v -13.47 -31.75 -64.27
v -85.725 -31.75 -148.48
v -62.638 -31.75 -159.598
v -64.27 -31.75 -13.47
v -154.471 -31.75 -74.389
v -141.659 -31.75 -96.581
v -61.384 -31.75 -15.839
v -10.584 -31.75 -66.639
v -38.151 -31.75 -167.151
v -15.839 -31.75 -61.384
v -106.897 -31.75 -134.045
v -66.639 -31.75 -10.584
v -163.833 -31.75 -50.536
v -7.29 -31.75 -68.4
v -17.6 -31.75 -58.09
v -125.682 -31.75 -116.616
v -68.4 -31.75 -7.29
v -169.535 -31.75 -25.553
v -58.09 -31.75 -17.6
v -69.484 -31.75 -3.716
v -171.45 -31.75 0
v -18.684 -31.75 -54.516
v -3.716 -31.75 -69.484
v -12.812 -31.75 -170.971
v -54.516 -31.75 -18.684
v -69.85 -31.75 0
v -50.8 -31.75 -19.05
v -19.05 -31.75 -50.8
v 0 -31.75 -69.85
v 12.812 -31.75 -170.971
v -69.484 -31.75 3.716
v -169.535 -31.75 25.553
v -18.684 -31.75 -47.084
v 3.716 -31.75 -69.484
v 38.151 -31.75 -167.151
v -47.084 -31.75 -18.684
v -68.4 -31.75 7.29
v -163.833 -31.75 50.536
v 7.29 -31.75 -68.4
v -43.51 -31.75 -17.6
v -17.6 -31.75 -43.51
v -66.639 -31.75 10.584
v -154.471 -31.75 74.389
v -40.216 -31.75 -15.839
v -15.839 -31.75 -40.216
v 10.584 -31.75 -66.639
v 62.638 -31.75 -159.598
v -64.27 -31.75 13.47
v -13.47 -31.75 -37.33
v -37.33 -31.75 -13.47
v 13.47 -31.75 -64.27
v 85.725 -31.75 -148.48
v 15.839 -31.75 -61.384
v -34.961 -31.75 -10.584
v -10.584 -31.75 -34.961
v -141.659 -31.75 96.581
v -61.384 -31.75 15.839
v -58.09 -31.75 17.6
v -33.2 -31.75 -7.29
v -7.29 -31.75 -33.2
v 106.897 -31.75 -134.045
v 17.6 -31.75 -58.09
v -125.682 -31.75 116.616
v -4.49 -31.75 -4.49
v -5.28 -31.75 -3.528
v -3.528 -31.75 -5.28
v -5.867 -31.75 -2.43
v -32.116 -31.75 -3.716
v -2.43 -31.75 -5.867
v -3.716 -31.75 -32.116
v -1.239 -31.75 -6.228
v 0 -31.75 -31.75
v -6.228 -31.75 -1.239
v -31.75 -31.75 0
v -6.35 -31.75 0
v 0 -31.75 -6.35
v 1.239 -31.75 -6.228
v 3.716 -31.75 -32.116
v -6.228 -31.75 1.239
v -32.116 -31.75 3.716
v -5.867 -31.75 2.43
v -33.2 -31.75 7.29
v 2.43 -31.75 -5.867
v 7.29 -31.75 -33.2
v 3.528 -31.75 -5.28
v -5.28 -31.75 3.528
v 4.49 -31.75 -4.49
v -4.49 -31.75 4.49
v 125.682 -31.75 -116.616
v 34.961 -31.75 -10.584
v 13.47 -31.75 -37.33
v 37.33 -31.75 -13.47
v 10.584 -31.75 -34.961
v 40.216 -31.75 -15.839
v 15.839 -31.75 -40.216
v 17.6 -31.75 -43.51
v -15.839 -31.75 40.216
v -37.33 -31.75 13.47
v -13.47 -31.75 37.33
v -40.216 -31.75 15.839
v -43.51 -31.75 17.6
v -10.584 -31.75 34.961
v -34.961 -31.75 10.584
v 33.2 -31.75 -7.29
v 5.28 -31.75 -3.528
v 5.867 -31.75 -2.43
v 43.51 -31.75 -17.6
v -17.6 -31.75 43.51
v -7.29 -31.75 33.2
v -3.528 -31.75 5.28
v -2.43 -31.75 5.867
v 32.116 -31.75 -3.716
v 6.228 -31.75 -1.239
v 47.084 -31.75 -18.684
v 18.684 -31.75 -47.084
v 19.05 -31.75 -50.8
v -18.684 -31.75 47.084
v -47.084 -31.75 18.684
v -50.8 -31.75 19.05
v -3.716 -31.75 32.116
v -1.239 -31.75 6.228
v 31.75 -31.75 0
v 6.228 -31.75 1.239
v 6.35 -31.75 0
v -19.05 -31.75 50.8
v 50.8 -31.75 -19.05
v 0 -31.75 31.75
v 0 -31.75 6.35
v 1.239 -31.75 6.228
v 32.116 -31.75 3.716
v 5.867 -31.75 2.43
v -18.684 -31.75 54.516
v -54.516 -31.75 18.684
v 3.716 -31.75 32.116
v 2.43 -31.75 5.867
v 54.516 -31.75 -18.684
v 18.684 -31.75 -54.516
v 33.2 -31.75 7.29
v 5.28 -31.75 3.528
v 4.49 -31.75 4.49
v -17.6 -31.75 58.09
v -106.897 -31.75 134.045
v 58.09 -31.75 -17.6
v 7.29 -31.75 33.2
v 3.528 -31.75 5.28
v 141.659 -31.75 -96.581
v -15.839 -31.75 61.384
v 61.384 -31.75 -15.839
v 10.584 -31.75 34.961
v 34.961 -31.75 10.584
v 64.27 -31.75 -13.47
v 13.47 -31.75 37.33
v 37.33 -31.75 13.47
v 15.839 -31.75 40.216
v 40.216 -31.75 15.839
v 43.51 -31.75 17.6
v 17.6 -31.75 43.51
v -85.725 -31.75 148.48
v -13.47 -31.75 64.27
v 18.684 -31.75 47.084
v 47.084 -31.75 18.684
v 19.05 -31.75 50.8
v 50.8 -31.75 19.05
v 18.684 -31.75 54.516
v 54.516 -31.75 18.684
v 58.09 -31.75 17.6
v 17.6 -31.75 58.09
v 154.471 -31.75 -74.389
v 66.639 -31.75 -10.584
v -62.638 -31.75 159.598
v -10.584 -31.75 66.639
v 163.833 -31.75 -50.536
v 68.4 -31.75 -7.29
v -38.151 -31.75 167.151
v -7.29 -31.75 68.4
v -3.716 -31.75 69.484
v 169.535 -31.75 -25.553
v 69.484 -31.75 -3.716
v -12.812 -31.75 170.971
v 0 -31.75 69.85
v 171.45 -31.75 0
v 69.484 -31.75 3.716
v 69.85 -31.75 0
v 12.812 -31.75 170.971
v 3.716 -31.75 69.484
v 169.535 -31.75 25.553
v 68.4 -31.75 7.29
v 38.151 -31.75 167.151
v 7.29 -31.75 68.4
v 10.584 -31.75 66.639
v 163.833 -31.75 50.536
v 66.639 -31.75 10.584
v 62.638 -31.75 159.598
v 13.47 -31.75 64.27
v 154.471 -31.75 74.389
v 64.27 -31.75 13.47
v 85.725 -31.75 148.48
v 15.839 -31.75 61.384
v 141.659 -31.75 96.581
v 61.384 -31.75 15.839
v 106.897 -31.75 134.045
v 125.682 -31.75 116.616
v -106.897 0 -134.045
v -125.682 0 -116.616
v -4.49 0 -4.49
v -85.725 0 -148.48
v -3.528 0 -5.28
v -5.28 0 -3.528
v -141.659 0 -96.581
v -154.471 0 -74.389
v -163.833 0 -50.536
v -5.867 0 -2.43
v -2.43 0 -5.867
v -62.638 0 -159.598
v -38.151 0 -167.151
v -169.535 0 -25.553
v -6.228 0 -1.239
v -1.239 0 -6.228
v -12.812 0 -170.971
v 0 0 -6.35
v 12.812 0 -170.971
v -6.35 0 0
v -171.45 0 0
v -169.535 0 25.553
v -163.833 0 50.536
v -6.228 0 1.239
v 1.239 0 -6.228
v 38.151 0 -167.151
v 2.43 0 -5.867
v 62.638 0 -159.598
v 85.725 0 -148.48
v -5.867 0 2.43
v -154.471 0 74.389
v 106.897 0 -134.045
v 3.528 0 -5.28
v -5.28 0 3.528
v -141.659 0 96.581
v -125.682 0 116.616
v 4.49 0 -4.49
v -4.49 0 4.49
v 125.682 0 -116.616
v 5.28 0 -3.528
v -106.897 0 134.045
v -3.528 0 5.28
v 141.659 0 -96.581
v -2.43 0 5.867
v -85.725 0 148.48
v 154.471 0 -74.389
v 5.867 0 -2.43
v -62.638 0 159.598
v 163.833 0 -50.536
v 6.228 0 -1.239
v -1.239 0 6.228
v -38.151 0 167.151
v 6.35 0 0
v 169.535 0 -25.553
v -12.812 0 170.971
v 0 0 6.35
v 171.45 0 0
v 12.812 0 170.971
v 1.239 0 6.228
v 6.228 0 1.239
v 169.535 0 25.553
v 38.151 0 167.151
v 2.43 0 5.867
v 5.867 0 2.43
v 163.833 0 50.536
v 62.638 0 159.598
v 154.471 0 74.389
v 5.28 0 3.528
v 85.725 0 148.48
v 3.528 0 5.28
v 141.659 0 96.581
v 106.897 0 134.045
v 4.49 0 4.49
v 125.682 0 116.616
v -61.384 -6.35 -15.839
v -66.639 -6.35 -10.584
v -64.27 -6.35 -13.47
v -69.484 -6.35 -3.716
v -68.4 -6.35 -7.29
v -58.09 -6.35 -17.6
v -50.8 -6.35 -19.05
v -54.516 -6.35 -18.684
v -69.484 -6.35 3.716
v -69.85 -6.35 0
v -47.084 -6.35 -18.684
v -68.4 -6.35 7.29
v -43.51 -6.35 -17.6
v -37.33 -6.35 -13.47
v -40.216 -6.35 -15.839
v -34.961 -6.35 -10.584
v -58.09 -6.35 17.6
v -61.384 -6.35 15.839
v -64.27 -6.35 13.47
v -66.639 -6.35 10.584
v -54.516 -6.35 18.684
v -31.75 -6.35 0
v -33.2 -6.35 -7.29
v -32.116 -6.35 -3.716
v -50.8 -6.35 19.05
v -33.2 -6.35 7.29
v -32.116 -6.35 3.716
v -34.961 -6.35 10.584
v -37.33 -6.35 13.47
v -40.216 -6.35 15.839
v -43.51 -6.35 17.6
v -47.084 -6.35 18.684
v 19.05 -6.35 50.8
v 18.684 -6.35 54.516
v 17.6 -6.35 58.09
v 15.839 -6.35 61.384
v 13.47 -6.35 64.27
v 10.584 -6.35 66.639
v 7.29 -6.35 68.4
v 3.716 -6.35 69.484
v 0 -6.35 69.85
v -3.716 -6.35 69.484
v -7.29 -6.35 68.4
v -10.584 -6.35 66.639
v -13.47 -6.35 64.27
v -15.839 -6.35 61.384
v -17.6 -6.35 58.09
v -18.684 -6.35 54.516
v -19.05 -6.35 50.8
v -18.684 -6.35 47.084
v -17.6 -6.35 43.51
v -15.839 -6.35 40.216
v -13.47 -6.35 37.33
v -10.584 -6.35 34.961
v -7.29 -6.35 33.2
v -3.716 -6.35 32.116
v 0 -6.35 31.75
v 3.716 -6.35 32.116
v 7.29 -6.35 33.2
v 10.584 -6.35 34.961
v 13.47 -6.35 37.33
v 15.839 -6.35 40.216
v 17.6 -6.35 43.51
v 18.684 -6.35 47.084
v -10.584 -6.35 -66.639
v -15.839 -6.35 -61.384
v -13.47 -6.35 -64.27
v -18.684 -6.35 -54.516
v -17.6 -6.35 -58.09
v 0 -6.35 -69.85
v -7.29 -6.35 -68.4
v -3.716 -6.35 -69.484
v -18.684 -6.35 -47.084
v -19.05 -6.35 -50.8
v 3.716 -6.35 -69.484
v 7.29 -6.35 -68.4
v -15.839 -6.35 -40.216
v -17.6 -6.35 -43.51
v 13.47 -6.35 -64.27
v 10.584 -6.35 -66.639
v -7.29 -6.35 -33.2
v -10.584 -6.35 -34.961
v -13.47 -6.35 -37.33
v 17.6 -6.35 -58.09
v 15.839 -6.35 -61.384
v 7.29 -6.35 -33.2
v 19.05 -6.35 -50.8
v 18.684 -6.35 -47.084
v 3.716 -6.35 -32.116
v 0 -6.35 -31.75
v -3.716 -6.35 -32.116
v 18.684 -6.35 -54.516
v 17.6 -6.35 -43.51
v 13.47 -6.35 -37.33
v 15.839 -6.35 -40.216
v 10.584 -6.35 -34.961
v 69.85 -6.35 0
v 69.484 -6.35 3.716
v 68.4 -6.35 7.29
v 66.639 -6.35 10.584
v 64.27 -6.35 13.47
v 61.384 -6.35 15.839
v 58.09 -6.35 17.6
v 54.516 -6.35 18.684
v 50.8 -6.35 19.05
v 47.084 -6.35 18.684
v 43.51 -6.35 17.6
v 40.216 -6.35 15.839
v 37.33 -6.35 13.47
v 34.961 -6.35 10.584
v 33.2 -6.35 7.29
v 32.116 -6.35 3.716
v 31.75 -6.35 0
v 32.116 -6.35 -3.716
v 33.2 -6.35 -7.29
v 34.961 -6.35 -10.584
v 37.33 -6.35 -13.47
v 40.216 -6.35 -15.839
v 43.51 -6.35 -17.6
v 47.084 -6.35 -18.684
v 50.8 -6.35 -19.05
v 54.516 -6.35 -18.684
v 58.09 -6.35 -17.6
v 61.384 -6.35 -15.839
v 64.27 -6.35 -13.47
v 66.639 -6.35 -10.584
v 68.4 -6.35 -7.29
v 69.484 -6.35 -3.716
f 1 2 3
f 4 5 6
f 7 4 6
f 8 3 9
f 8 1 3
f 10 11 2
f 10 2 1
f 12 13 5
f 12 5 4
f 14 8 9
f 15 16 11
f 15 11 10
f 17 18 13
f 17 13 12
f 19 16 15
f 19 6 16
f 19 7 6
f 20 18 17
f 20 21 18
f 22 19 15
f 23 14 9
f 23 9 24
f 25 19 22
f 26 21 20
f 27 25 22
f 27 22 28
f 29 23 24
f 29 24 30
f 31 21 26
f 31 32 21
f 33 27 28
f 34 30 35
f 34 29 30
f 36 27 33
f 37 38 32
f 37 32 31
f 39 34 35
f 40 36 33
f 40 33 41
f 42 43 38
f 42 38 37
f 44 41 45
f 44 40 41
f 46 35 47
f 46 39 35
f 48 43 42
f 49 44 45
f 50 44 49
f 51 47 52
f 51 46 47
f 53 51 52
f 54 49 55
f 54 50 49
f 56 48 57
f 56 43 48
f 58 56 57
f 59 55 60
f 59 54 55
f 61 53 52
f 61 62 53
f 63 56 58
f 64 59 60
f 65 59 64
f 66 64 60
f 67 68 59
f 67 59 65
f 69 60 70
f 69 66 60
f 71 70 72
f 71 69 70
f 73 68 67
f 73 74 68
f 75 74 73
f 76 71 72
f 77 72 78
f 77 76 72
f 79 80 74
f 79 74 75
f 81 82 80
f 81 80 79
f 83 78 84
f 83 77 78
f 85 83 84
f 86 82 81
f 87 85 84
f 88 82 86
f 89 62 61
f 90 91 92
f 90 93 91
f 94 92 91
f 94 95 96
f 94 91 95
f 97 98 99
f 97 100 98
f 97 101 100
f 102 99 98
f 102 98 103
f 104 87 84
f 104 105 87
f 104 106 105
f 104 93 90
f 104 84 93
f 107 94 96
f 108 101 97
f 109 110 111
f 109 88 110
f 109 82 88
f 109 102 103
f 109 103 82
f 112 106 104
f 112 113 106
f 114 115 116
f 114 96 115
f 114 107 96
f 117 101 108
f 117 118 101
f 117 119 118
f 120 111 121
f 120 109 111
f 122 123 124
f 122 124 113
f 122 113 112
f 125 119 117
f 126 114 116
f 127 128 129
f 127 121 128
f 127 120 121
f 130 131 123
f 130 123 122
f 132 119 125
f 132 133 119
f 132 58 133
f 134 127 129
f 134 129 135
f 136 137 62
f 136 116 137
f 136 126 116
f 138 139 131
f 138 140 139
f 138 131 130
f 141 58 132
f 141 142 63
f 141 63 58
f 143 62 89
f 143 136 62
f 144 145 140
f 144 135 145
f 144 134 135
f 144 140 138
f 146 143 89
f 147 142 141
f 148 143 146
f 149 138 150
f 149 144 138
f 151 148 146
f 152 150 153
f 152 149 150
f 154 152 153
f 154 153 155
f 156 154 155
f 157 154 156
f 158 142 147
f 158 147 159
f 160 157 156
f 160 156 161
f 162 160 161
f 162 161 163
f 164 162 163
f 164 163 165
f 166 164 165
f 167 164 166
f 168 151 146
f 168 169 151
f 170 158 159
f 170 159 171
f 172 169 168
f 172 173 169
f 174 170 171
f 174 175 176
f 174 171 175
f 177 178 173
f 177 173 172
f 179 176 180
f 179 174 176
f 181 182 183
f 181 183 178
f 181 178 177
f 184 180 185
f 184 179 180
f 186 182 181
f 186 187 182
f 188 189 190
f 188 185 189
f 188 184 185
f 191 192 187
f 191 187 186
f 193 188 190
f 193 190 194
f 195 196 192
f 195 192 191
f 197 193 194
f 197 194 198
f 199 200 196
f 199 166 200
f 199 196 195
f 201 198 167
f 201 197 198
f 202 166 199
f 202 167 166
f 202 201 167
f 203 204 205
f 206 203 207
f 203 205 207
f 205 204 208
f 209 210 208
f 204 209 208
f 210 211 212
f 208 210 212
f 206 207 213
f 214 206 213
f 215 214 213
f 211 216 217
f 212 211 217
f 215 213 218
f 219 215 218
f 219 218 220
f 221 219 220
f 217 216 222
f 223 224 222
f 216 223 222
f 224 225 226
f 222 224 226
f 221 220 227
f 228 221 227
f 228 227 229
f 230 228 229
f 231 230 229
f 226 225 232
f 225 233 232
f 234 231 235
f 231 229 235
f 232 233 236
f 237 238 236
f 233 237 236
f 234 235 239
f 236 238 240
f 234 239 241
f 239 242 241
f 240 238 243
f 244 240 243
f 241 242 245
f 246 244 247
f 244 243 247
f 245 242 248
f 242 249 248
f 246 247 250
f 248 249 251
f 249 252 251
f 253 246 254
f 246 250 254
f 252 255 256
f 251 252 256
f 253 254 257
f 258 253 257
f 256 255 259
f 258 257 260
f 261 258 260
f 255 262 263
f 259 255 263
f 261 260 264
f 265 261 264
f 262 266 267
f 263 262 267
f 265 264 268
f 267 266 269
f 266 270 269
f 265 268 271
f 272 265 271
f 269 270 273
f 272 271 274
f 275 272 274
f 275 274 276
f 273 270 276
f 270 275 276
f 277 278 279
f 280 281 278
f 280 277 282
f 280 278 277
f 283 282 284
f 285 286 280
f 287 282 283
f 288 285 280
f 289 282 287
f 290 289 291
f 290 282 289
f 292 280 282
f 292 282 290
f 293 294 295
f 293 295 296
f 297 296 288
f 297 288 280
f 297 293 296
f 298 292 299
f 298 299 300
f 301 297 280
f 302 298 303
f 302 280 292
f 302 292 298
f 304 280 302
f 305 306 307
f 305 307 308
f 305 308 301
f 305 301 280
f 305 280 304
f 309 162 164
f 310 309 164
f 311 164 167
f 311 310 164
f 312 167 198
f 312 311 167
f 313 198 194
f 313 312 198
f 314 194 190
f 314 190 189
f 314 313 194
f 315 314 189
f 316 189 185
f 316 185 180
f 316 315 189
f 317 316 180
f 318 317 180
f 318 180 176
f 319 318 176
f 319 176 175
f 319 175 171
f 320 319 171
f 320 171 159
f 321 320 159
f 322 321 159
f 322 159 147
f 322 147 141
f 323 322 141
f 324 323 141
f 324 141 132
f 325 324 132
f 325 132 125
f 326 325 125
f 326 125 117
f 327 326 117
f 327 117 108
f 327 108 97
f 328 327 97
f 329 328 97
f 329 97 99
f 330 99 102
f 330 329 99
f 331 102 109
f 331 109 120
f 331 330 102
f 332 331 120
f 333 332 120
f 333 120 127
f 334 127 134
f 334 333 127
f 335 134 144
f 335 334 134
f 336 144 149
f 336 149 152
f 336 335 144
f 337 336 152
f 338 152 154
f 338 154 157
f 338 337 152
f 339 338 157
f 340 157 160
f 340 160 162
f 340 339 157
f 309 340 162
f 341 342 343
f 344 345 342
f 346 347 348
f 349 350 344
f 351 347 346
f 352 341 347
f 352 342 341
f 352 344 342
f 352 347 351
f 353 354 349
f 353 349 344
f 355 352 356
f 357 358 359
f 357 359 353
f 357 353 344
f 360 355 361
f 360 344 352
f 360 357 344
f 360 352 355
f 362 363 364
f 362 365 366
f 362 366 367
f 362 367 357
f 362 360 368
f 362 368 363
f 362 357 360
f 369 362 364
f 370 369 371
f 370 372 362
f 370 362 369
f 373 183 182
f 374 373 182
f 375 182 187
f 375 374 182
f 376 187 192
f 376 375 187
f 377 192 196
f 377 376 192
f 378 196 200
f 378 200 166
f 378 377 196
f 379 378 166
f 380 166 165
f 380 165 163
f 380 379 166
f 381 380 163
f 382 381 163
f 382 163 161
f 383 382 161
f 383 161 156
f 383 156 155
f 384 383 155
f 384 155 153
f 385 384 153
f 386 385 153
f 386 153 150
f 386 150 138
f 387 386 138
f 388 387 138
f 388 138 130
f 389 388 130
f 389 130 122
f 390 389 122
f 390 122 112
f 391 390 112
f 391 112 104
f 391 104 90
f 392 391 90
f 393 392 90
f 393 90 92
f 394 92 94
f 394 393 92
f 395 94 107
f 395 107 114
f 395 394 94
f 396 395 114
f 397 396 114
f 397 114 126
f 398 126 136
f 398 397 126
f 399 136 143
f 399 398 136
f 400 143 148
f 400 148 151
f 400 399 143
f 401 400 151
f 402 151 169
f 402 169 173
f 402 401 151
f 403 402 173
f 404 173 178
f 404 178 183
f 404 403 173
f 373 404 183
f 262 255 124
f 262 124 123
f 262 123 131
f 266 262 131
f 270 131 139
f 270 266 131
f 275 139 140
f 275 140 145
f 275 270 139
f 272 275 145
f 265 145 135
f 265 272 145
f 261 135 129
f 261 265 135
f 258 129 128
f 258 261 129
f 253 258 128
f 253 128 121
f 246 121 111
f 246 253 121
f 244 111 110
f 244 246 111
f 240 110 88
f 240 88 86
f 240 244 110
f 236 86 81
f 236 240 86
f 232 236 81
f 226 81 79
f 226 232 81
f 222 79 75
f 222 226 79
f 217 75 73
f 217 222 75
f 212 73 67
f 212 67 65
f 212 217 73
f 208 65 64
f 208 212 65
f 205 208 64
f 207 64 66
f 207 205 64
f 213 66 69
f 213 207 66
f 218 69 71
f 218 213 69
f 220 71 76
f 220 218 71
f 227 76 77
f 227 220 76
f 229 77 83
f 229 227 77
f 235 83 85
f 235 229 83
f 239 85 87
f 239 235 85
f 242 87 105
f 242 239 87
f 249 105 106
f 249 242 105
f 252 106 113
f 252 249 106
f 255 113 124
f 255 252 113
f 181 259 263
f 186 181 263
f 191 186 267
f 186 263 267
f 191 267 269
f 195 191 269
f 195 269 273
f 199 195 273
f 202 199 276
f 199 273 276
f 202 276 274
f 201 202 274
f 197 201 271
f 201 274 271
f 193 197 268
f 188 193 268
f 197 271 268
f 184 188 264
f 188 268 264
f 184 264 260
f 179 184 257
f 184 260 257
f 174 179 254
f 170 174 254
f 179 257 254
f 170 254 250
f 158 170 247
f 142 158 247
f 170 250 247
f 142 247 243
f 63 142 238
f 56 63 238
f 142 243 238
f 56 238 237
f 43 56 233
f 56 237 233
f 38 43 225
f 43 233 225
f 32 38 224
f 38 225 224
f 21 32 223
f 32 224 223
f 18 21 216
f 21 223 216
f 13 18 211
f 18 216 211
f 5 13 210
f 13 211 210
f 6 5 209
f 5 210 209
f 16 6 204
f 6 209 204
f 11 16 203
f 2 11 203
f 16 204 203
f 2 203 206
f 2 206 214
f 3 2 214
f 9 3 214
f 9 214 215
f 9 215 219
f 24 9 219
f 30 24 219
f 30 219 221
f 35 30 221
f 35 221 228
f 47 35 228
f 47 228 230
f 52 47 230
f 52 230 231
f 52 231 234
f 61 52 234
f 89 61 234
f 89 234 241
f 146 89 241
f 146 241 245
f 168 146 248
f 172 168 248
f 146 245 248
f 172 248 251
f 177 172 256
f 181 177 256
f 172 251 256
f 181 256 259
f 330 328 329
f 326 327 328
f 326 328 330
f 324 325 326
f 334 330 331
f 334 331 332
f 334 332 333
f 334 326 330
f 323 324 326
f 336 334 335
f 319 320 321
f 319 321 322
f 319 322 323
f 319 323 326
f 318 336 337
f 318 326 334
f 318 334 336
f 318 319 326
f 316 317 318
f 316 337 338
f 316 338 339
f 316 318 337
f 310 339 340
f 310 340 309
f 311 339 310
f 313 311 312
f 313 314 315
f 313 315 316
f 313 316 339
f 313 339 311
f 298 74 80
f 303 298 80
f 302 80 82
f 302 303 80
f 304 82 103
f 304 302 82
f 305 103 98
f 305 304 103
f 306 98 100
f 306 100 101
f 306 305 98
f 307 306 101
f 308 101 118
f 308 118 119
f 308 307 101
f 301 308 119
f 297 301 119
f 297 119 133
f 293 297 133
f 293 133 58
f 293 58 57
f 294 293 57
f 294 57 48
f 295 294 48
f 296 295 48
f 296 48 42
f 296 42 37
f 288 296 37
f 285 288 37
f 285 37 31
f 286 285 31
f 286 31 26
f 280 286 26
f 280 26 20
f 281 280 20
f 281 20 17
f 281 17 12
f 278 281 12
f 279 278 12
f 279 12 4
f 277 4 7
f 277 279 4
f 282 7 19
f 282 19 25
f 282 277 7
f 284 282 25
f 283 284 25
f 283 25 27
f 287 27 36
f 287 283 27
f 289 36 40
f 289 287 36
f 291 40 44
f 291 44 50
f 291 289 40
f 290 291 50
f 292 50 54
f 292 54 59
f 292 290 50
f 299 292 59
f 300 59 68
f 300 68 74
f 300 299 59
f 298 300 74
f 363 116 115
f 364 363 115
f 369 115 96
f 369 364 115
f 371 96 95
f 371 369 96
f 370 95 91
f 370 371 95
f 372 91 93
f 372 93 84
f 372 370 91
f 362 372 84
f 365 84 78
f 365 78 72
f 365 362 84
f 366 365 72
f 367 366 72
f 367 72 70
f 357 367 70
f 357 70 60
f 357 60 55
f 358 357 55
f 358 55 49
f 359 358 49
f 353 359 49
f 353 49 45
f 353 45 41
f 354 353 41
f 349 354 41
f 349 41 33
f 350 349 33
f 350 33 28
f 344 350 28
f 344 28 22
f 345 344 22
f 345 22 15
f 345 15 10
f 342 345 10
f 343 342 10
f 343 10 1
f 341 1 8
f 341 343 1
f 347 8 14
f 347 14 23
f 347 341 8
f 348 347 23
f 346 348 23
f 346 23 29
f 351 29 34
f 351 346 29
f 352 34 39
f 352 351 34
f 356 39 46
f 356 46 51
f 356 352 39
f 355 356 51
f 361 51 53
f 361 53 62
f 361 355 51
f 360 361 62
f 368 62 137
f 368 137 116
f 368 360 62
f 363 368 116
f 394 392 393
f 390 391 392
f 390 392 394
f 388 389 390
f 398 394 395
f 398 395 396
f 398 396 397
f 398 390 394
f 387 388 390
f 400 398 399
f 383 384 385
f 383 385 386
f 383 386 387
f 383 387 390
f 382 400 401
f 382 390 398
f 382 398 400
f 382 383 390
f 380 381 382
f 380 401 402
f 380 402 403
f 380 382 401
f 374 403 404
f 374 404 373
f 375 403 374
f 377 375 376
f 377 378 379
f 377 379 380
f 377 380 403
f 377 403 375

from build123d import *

# Parameters (mm, degrees)
F0_R     = 171.45
F0_R_2   = 19.05
F0_R_3   = 6.35
F1_DEPTH = 31.75
F2_DEPTH = 6.35


with BuildPart() as f1:
    # F0 (on Front) → F1 (new body)
    with BuildSketch(Plane.XZ):
        Circle(F0_R)
        with Locations((0, -50.8)):
            Circle(F0_R_2, mode=Mode.SUBTRACT)
        with Locations((-50.8, 0)):
            Circle(F0_R_2, mode=Mode.SUBTRACT)
        Circle(F0_R_3, mode=Mode.SUBTRACT)
        with Locations((50.8, 0)):
            Circle(F0_R_2, mode=Mode.SUBTRACT)
        with Locations((0, 50.8)):
            Circle(F0_R_2, mode=Mode.SUBTRACT)
    extrude(amount=F1_DEPTH)

    # F0 (on Front) → F2 (join)
    with BuildSketch(Plane.XZ):
        with Locations((0, 50.8)):
            Circle(F0_R_2)
        with Locations((50.8, 0)):
            Circle(F0_R_2)
        with Locations((-50.8, 0)):
            Circle(F0_R_2)
        with Locations((0, -50.8)):
            Circle(F0_R_2)
    extrude(amount=F2_DEPTH)


solid = f1.part
